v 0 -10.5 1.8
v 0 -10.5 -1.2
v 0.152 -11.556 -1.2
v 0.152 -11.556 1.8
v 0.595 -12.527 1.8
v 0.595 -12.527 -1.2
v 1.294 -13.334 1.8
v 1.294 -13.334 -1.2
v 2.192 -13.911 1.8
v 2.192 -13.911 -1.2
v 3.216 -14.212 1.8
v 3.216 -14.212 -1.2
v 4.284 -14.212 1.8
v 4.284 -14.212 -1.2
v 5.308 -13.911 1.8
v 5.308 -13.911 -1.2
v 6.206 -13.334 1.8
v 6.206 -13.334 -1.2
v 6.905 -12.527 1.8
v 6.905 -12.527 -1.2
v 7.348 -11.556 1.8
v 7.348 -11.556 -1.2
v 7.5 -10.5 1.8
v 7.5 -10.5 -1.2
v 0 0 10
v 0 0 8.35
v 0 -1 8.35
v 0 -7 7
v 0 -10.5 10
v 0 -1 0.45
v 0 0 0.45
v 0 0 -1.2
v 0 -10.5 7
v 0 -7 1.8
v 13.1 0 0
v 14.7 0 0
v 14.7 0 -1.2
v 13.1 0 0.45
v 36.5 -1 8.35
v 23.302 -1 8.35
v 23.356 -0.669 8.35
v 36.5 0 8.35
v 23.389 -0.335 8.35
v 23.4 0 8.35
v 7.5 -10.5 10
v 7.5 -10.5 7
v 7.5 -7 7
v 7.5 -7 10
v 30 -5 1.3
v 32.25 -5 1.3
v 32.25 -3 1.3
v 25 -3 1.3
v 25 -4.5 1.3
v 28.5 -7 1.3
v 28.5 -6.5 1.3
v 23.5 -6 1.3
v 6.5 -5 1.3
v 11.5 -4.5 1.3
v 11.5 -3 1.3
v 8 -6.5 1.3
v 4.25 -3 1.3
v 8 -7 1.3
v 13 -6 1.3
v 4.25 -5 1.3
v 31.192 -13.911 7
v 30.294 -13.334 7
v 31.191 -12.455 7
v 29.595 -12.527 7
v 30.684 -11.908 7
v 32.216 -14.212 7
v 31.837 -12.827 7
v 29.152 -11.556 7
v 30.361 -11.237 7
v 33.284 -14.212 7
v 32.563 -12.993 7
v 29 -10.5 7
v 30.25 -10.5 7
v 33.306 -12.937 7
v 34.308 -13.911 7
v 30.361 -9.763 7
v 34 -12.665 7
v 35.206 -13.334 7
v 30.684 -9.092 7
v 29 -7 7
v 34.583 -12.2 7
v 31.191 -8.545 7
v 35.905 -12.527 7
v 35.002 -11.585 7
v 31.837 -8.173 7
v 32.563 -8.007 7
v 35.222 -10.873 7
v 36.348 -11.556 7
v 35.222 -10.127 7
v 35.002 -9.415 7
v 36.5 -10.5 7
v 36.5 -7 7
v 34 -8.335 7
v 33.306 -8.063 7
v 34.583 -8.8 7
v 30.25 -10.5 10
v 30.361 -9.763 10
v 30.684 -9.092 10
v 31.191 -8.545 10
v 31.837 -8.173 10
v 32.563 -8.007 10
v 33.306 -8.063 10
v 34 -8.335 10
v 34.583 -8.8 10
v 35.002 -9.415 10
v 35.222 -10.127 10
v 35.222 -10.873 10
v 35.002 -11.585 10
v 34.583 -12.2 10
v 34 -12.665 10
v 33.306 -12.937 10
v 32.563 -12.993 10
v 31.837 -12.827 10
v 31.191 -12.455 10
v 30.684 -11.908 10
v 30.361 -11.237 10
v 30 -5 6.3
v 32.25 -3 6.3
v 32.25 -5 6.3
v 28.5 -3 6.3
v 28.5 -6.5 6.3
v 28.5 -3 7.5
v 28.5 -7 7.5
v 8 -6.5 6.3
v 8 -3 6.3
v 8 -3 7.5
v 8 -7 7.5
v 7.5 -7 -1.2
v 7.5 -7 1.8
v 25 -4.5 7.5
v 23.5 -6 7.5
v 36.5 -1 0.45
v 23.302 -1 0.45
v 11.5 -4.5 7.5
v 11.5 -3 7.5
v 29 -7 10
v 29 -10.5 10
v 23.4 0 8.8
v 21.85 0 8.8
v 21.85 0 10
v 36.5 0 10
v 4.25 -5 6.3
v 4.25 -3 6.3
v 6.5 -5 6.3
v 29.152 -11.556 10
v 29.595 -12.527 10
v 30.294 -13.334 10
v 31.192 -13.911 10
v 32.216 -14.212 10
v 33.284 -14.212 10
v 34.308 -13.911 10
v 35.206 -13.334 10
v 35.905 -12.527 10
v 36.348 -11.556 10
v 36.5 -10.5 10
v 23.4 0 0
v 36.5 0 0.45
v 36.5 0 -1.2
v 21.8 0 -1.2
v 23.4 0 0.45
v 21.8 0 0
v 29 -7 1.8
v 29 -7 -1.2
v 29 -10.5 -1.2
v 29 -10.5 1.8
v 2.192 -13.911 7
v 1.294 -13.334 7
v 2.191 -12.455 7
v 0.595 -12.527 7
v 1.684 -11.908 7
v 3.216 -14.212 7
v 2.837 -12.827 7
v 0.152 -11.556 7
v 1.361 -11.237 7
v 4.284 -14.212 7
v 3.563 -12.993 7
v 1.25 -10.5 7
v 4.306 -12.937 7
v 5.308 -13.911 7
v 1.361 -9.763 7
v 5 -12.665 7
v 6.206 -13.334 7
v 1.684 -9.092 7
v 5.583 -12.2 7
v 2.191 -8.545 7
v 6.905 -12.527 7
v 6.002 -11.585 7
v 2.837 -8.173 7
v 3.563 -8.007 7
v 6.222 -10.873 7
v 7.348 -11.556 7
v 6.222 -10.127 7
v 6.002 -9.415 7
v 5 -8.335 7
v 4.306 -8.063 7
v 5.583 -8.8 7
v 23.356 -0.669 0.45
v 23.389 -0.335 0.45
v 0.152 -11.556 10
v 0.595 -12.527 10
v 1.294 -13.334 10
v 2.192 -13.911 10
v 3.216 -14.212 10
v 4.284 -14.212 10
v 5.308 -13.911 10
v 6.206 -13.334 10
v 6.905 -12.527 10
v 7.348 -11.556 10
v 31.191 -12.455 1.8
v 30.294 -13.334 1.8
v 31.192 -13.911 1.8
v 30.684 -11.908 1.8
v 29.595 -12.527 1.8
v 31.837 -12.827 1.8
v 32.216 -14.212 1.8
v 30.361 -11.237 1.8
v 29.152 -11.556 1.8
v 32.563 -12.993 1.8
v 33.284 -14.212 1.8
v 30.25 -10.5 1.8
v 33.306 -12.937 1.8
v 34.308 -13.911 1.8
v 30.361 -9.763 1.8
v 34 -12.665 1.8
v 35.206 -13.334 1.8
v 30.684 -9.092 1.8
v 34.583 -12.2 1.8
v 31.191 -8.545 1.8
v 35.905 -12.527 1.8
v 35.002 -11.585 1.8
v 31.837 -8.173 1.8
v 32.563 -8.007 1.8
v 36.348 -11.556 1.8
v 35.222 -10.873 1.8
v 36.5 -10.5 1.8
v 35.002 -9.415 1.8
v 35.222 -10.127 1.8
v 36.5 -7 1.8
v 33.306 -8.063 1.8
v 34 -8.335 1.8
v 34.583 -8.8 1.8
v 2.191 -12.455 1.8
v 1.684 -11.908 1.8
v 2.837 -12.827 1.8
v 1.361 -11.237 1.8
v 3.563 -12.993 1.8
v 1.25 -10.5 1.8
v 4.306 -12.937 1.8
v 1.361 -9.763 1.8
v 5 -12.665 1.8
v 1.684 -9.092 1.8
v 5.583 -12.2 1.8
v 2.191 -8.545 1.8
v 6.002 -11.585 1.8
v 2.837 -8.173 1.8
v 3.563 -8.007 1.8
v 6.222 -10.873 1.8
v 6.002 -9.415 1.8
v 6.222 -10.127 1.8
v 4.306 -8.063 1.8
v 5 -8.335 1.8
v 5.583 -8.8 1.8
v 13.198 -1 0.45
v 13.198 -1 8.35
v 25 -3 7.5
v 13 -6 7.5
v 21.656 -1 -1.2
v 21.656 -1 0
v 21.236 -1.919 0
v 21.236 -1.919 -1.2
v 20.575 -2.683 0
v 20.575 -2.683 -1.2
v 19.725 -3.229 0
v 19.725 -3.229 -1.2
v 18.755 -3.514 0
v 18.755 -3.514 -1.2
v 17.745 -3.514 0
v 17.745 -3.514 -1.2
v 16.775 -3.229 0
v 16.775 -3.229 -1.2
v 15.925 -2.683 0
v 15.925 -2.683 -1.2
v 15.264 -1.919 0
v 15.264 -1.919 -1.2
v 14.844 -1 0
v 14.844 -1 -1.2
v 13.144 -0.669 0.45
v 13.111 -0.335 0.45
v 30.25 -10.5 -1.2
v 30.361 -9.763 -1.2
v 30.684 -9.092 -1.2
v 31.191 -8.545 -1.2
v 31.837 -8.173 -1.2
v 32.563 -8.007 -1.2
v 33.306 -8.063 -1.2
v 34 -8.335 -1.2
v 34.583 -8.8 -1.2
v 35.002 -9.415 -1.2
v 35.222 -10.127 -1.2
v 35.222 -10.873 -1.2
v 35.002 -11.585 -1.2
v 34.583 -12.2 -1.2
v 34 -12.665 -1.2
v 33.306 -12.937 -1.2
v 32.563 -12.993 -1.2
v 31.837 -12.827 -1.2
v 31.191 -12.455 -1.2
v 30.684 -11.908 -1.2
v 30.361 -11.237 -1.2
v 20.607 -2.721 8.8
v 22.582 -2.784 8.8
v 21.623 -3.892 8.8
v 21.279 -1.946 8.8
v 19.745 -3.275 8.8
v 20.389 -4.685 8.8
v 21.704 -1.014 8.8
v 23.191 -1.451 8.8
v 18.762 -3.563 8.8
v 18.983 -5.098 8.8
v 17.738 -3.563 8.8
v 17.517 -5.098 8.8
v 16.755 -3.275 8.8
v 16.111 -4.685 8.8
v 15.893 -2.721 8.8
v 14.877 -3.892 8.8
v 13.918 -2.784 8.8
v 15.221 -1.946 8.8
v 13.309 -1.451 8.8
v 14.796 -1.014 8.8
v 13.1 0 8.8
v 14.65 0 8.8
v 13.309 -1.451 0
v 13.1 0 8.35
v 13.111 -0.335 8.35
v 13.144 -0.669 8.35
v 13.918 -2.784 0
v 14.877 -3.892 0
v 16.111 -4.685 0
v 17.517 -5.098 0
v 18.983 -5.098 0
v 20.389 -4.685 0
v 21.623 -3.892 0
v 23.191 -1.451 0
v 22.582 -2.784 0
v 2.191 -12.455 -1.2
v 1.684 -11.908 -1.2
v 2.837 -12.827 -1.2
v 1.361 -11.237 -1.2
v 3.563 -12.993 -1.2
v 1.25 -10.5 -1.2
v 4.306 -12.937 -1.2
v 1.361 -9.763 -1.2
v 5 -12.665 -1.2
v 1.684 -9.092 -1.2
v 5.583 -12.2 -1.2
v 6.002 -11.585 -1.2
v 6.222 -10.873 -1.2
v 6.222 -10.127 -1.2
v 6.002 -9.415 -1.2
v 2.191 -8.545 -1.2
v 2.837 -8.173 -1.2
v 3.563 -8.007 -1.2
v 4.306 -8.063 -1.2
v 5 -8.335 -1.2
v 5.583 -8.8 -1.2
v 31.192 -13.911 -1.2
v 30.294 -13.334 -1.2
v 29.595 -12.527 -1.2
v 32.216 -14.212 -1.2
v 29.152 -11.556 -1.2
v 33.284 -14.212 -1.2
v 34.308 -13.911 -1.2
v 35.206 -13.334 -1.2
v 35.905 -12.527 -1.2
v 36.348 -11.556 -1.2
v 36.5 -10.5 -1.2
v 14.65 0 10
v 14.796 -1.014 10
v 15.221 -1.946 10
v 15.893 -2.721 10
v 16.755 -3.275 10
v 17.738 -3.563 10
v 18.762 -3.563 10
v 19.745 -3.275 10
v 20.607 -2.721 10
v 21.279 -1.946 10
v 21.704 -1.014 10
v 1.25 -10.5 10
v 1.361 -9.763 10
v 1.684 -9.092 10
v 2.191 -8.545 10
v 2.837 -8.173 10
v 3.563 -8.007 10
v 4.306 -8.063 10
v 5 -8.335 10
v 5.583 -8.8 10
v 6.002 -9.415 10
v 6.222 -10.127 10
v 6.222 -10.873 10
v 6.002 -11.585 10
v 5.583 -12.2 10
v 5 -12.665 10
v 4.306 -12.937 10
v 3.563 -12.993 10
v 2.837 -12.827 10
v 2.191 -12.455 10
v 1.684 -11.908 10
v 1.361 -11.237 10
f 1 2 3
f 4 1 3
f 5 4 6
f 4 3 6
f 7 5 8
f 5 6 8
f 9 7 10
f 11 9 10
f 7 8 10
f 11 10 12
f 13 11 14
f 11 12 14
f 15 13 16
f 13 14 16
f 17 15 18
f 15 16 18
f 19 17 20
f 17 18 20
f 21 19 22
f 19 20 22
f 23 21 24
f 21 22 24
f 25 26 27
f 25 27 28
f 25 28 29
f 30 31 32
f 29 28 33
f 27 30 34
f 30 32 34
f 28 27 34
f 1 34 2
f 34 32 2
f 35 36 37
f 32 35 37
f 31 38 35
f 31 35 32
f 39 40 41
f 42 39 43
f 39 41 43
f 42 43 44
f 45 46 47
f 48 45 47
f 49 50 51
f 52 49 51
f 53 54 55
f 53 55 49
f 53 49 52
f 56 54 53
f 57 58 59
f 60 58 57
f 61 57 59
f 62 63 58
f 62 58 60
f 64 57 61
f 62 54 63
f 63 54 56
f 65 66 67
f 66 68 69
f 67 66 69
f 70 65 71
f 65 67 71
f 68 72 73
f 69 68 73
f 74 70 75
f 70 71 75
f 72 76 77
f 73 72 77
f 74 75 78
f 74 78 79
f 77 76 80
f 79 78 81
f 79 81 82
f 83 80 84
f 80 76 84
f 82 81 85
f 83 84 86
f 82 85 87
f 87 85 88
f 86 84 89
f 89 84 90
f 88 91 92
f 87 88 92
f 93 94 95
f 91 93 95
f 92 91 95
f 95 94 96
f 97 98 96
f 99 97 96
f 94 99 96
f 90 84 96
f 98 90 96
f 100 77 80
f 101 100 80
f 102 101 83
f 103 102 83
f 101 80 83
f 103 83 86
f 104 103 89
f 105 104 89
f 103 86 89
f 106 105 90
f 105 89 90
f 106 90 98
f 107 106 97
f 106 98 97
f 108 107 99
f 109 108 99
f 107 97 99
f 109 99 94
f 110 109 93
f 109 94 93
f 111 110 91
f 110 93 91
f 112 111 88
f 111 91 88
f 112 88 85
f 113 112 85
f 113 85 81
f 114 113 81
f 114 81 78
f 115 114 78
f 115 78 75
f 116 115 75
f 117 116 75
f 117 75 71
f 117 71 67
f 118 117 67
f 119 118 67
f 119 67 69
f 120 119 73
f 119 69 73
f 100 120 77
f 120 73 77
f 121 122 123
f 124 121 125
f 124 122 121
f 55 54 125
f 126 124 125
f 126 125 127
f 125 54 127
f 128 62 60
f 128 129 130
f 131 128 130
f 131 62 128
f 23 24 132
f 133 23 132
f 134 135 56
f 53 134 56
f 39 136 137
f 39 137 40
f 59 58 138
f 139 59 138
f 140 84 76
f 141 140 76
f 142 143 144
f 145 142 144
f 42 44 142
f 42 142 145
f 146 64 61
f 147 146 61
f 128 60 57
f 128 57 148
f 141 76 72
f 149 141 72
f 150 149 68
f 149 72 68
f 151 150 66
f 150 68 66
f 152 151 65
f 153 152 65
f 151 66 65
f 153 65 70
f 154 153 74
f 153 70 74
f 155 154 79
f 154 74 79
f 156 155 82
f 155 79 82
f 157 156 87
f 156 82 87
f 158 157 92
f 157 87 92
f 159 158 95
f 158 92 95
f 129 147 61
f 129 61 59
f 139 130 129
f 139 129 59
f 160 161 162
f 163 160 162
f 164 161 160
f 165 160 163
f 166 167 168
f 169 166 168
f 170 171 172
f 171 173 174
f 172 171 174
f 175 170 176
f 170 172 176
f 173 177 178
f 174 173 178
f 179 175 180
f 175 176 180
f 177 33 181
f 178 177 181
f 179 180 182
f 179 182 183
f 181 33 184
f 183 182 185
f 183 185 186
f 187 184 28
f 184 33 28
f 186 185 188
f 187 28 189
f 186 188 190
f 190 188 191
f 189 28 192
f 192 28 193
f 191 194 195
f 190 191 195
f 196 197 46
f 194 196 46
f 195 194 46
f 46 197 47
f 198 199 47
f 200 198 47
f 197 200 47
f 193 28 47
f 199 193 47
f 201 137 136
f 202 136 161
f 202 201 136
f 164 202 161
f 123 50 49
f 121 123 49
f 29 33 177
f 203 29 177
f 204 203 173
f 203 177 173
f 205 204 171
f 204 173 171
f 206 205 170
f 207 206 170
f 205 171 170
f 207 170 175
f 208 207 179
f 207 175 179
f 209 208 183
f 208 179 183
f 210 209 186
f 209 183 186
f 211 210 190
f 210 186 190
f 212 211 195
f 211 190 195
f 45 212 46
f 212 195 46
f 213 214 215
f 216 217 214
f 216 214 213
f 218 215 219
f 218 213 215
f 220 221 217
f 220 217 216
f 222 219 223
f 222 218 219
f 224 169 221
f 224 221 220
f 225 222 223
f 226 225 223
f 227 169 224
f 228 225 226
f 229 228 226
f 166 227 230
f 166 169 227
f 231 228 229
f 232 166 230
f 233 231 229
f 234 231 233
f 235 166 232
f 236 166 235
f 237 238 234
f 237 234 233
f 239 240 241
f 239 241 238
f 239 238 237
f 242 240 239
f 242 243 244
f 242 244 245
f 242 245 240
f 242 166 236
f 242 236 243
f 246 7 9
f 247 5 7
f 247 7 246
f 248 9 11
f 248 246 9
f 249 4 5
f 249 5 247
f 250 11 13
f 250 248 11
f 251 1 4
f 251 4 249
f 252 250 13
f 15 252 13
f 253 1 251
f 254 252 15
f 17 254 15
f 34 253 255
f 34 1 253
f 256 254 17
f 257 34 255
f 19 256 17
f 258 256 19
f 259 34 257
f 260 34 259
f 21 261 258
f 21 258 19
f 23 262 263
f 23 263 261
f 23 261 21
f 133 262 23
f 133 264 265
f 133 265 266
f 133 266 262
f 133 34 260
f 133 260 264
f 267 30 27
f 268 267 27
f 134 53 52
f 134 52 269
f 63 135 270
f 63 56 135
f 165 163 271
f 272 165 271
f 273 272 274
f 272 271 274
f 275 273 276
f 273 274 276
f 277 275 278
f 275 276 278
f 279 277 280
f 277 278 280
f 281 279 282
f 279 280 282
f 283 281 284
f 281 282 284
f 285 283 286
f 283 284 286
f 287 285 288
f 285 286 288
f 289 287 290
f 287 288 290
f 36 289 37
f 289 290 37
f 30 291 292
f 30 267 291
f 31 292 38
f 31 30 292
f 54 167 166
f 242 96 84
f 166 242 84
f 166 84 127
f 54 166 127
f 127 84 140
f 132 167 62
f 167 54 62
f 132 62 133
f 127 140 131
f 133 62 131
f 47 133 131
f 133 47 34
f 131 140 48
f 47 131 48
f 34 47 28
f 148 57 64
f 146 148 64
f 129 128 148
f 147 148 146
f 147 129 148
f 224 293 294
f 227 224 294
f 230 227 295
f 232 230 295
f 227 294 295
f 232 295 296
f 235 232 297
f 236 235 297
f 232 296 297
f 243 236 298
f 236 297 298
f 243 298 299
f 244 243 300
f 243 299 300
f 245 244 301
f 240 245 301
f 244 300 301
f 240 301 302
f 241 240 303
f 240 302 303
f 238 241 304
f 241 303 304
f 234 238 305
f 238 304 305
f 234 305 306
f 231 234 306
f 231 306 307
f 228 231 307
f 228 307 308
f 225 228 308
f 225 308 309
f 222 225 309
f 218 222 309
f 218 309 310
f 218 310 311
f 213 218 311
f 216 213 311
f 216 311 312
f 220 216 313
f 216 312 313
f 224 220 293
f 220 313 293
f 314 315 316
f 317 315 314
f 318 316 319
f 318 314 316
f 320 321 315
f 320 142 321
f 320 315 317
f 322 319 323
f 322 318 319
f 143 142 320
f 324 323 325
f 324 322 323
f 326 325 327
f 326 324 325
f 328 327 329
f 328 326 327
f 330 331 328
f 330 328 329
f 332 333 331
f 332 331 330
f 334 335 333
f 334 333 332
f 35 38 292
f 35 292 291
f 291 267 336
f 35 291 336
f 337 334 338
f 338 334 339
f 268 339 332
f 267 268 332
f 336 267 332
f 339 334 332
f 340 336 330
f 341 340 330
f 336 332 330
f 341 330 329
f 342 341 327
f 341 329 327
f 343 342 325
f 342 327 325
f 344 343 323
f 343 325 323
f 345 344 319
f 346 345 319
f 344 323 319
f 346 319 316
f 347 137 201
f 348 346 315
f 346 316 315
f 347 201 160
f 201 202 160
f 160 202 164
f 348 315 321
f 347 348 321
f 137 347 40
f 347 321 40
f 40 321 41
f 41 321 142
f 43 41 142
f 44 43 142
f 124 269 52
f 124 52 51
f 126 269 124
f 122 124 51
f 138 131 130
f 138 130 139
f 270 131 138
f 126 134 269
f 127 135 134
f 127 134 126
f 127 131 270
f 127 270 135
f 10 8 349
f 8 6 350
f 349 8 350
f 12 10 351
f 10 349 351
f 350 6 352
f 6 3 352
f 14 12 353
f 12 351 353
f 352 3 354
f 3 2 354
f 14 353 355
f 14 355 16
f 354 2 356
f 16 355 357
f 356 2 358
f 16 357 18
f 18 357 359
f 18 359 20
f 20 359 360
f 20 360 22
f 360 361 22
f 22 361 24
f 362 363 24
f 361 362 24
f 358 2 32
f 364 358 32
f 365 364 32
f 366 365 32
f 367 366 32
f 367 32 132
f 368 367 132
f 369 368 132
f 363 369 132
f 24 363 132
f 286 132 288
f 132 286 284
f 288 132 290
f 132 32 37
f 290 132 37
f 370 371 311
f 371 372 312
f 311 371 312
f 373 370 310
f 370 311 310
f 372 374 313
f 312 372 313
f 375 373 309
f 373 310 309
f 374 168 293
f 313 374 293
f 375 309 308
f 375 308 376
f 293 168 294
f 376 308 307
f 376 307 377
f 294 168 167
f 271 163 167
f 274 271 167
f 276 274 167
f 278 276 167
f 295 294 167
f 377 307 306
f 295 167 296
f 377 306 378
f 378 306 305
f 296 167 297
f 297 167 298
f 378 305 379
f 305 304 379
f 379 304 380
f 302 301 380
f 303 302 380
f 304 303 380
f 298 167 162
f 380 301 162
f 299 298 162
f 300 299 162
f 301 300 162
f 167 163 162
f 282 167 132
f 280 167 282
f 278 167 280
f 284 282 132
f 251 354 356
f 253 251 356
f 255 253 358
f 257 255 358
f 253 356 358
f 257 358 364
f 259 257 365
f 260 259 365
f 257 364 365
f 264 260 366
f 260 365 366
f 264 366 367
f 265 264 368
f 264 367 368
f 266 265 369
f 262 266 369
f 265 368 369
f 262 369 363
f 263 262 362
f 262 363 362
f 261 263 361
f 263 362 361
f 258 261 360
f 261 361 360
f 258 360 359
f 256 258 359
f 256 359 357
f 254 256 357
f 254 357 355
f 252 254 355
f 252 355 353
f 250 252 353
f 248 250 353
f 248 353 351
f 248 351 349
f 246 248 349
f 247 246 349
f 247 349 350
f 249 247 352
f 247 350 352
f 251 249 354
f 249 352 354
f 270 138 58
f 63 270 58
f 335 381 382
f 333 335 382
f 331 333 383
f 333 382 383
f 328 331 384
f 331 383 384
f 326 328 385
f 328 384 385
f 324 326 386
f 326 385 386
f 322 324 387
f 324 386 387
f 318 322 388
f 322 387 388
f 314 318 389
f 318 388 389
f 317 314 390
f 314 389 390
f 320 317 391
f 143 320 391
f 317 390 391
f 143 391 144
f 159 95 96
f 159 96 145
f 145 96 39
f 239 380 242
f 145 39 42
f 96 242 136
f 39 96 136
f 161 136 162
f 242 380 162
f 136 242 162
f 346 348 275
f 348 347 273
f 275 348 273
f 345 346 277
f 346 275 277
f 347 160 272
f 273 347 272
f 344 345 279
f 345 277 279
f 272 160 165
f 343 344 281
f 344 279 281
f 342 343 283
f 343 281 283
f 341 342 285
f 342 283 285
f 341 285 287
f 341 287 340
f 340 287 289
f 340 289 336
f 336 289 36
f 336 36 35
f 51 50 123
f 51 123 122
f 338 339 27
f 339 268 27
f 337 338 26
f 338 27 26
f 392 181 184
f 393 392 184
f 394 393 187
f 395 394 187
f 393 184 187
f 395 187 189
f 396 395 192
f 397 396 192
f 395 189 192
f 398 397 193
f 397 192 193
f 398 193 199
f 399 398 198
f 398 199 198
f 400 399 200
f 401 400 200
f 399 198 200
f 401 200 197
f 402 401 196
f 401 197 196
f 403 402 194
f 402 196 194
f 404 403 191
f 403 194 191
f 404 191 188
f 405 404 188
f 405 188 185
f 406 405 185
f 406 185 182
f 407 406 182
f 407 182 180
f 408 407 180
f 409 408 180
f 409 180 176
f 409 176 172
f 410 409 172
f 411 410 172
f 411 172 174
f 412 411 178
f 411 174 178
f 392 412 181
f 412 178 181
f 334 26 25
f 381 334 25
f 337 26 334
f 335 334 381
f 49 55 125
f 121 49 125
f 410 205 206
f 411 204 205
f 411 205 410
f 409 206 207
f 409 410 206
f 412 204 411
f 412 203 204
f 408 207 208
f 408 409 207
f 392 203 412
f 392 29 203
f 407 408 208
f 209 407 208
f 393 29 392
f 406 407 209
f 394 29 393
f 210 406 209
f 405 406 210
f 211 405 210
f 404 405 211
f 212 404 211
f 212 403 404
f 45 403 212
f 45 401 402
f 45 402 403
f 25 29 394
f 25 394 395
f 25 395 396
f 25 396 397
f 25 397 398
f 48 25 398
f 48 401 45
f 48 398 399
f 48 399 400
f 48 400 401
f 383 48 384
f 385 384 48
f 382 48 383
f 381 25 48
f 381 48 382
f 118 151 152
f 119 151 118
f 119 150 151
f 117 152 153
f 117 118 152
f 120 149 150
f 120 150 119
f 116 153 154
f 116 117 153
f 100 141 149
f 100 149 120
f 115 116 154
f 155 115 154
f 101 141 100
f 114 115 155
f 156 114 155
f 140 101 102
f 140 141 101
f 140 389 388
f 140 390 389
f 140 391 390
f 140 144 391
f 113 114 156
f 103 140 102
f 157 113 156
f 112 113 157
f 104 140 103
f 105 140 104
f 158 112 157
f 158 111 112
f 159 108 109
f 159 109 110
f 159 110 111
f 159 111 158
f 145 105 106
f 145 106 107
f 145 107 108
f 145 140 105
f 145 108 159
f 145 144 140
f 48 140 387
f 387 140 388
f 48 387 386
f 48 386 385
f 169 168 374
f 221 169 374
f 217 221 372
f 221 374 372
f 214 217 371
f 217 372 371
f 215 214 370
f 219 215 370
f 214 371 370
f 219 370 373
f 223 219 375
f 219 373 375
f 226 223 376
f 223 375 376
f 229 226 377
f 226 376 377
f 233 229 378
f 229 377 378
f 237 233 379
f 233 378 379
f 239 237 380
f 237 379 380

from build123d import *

# Parameters (mm, degrees)
ESQUISSE1_W                     = 36.5
ESQUISSE1_H                     = 7
BOSS_EXTRU_1_DEPTH              = 10
ESQUISSE2_R                     = 5.15
ENL_V_MAT_EXTRU_1_DEPTH         = 10
ESQUISSE3_W                     = 7.9
ESQUISSE3_H                     = 1
ENL_V_MAT_EXTRU_2_DEPTH         = 40
ESQUISSE5_W                     = 36.5
ESQUISSE5_H                     = 7
BOSS_EXTRU_2_DEPTH              = 1.2
ESQUISSE6_R                     = 3.55
ENL_V_MAT_EXTRU_3_DEPTH         = 10
ESQUISSE8_R                     = 2.5
BOSS_EXTRU_3_DEPTH              = 3
R_P_TITION_LIN_AIRE1_COUNT      = 2
R_P_TITION_LIN_AIRE1_PITCH      = 8.2
R_P_TITION_LIN_AIRE1_COUNT_DIR2 = 2
R_P_TITION_LIN_AIRE1_PITCH_DIR2 = 29
R_P_TITION_LIN_AIRE2_COUNT      = 2
R_P_TITION_LIN_AIRE2_PITCH      = 10
ESQUISSE10_R                    = 3.6
ENL_V_MAT_EXTRU_4_DEPTH         = 1.2
ESQUISSE11_W                    = 3.5
ESQUISSE11_H                    = 6.2
ENL_V_MAT_EXTRU_5_DEPTH         = 4
ENL_V_START                     = -2.5
ESQUISSE15_W                    = 3.75
ESQUISSE15_H                    = 2
ENL_V_MAT_EXTRU_7_DEPTH         = 5
ESQUISSE12_W                    = 13.5
ESQUISSE12_H                    = 6.2
ENL_V_MAT_EXTRU_6_DEPTH         = 1
CHANFREIN1_SIZE                 = 1.5


with BuildPart() as part:
    # Esquisse1 → Boss.-Extru.1 (new body)
    with BuildSketch(Plane.XY):
        with Locations((18.25, -3.5)):
            Rectangle(ESQUISSE1_W, ESQUISSE1_H)
    extrude(amount=BOSS_EXTRU_1_DEPTH)

    # Esquisse2 → Enlèv. mat.-Extru.1 (cut)
    with BuildSketch(Plane.XY.offset(10)):
        with Locations((18.25, 0)):
            Circle(ESQUISSE2_R)
    extrude(amount=-ENL_V_MAT_EXTRU_1_DEPTH, mode=Mode.SUBTRACT)

    # Esquisse3 → Enlèv. mat.-Extru.2 (cut)
    with BuildSketch(Plane.ZY):
        with Locations((4.4, -0.5)):
            Rectangle(ESQUISSE3_W, ESQUISSE3_H)
    extrude(amount=-ENL_V_MAT_EXTRU_2_DEPTH, mode=Mode.SUBTRACT)

    # Esquisse5 → Boss.-Extru.2 (add)
    with BuildSketch(Plane(origin=(0, 0, 0), x_dir=(-1, 0, 0), z_dir=(0, 0, -1))):
        with Locations((-18.25, -3.5)):
            Rectangle(ESQUISSE5_W, ESQUISSE5_H)
    boss_extru_2 = extrude(amount=BOSS_EXTRU_2_DEPTH)

    # Esquisse6 → Enlèv. mat.-Extru.3 (cut)
    with BuildSketch(Plane(origin=(0, 0, -1.2), x_dir=(-1, 0, 0), z_dir=(0, 0, -1))):
        with Locations((-18.25, 0)):
            Circle(ESQUISSE6_R)
    extrude(amount=-ENL_V_MAT_EXTRU_3_DEPTH, mode=Mode.SUBTRACT)

    # Esquisse8 → Boss.-Extru.3 (add)
    with BuildSketch(Plane(origin=(0, 0, -1.2), x_dir=(-1, 0, 0), z_dir=(0, 0, -1))):
        with BuildLine():
            Line((-36.5, -7), (-29, -7))
            Line((-29, -7), (-29, -10.5))
            ThreePointArc((-29, -10.5), (-32.75, -14.25), (-36.5, -10.5))
            Line((-36.5, -10.5), (-36.5, -7))
        make_face()
        with Locations((-32.75, -10.5)):
            Circle(ESQUISSE8_R, mode=Mode.SUBTRACT)
    boss_extru_3 = extrude(amount=-BOSS_EXTRU_3_DEPTH)

    # Répétition linéaire1: Boss.-Extru.3 2 × 2
    with Locations(*[(-j * R_P_TITION_LIN_AIRE1_PITCH_DIR2, 0, i * R_P_TITION_LIN_AIRE1_PITCH) for i in range(R_P_TITION_LIN_AIRE1_COUNT) for j in range(R_P_TITION_LIN_AIRE1_COUNT_DIR2) if (i, j) != (0, 0)]):
        add(boss_extru_3)

    # Répétition linéaire2: Boss.-Extru.2 ×2
    with Locations(*[(0, 0, i * R_P_TITION_LIN_AIRE2_PITCH) for i in range(1, R_P_TITION_LIN_AIRE2_COUNT)]):
        add(boss_extru_2)

    # Esquisse10 → Enlèv. mat.-Extru.4 (cut)
    with BuildSketch(Plane.XY.offset(10)):
        with Locations((18.25, 0)):
            Circle(ESQUISSE10_R)
    extrude(amount=-ENL_V_MAT_EXTRU_4_DEPTH, mode=Mode.SUBTRACT)

    # Esquisse11 → Enlèv. mat.-Extru.5 (cut)
    with BuildSketch(Plane.XZ.offset(7)):
        with Locations((9.75, 4.4)):
            Rectangle(ESQUISSE11_W, ESQUISSE11_H)
        with Locations((26.75, 4.4)):
            Rectangle(ESQUISSE11_W, ESQUISSE11_H)
    extrude(amount=-ENL_V_MAT_EXTRU_5_DEPTH, mode=Mode.SUBTRACT)

    # Esquisse15 → Enlèv. mat.-Extru.7 (cut)
    with BuildSketch(Plane(origin=(0, 0, -1.2), x_dir=(-1, 0, 0), z_dir=(0, 0, -1)).offset(ENL_V_START)):
        with Locations((-6.125, -4)):
            Rectangle(ESQUISSE15_W, ESQUISSE15_H)
        with Locations((-30.375, -4)):
            Rectangle(ESQUISSE15_W, ESQUISSE15_H)
    extrude(amount=-ENL_V_MAT_EXTRU_7_DEPTH, mode=Mode.SUBTRACT)

    # Esquisse12 → Enlèv. mat.-Extru.6 (cut)
    with BuildSketch(Plane(origin=(0, -7, 0), x_dir=(-1, 0, 0), z_dir=(0, -1, 0))):
        with Locations((-18.25, -4.4)):
            Rectangle(ESQUISSE12_W, ESQUISSE12_H)
    extrude(amount=-ENL_V_MAT_EXTRU_6_DEPTH, mode=Mode.SUBTRACT)

    # Chanfrein1
    chanfrein1_edges = [part.edges().sort_by_distance(p)[0] for p in [
        (8, -5, 3.8),
        (28.5, -5, 3.8),
        (11.5, -6, 4.4),
        (25, -6, 4.4),
    ]]
    chamfer(chanfrein1_edges, length=CHANFREIN1_SIZE)


solid = part.part
